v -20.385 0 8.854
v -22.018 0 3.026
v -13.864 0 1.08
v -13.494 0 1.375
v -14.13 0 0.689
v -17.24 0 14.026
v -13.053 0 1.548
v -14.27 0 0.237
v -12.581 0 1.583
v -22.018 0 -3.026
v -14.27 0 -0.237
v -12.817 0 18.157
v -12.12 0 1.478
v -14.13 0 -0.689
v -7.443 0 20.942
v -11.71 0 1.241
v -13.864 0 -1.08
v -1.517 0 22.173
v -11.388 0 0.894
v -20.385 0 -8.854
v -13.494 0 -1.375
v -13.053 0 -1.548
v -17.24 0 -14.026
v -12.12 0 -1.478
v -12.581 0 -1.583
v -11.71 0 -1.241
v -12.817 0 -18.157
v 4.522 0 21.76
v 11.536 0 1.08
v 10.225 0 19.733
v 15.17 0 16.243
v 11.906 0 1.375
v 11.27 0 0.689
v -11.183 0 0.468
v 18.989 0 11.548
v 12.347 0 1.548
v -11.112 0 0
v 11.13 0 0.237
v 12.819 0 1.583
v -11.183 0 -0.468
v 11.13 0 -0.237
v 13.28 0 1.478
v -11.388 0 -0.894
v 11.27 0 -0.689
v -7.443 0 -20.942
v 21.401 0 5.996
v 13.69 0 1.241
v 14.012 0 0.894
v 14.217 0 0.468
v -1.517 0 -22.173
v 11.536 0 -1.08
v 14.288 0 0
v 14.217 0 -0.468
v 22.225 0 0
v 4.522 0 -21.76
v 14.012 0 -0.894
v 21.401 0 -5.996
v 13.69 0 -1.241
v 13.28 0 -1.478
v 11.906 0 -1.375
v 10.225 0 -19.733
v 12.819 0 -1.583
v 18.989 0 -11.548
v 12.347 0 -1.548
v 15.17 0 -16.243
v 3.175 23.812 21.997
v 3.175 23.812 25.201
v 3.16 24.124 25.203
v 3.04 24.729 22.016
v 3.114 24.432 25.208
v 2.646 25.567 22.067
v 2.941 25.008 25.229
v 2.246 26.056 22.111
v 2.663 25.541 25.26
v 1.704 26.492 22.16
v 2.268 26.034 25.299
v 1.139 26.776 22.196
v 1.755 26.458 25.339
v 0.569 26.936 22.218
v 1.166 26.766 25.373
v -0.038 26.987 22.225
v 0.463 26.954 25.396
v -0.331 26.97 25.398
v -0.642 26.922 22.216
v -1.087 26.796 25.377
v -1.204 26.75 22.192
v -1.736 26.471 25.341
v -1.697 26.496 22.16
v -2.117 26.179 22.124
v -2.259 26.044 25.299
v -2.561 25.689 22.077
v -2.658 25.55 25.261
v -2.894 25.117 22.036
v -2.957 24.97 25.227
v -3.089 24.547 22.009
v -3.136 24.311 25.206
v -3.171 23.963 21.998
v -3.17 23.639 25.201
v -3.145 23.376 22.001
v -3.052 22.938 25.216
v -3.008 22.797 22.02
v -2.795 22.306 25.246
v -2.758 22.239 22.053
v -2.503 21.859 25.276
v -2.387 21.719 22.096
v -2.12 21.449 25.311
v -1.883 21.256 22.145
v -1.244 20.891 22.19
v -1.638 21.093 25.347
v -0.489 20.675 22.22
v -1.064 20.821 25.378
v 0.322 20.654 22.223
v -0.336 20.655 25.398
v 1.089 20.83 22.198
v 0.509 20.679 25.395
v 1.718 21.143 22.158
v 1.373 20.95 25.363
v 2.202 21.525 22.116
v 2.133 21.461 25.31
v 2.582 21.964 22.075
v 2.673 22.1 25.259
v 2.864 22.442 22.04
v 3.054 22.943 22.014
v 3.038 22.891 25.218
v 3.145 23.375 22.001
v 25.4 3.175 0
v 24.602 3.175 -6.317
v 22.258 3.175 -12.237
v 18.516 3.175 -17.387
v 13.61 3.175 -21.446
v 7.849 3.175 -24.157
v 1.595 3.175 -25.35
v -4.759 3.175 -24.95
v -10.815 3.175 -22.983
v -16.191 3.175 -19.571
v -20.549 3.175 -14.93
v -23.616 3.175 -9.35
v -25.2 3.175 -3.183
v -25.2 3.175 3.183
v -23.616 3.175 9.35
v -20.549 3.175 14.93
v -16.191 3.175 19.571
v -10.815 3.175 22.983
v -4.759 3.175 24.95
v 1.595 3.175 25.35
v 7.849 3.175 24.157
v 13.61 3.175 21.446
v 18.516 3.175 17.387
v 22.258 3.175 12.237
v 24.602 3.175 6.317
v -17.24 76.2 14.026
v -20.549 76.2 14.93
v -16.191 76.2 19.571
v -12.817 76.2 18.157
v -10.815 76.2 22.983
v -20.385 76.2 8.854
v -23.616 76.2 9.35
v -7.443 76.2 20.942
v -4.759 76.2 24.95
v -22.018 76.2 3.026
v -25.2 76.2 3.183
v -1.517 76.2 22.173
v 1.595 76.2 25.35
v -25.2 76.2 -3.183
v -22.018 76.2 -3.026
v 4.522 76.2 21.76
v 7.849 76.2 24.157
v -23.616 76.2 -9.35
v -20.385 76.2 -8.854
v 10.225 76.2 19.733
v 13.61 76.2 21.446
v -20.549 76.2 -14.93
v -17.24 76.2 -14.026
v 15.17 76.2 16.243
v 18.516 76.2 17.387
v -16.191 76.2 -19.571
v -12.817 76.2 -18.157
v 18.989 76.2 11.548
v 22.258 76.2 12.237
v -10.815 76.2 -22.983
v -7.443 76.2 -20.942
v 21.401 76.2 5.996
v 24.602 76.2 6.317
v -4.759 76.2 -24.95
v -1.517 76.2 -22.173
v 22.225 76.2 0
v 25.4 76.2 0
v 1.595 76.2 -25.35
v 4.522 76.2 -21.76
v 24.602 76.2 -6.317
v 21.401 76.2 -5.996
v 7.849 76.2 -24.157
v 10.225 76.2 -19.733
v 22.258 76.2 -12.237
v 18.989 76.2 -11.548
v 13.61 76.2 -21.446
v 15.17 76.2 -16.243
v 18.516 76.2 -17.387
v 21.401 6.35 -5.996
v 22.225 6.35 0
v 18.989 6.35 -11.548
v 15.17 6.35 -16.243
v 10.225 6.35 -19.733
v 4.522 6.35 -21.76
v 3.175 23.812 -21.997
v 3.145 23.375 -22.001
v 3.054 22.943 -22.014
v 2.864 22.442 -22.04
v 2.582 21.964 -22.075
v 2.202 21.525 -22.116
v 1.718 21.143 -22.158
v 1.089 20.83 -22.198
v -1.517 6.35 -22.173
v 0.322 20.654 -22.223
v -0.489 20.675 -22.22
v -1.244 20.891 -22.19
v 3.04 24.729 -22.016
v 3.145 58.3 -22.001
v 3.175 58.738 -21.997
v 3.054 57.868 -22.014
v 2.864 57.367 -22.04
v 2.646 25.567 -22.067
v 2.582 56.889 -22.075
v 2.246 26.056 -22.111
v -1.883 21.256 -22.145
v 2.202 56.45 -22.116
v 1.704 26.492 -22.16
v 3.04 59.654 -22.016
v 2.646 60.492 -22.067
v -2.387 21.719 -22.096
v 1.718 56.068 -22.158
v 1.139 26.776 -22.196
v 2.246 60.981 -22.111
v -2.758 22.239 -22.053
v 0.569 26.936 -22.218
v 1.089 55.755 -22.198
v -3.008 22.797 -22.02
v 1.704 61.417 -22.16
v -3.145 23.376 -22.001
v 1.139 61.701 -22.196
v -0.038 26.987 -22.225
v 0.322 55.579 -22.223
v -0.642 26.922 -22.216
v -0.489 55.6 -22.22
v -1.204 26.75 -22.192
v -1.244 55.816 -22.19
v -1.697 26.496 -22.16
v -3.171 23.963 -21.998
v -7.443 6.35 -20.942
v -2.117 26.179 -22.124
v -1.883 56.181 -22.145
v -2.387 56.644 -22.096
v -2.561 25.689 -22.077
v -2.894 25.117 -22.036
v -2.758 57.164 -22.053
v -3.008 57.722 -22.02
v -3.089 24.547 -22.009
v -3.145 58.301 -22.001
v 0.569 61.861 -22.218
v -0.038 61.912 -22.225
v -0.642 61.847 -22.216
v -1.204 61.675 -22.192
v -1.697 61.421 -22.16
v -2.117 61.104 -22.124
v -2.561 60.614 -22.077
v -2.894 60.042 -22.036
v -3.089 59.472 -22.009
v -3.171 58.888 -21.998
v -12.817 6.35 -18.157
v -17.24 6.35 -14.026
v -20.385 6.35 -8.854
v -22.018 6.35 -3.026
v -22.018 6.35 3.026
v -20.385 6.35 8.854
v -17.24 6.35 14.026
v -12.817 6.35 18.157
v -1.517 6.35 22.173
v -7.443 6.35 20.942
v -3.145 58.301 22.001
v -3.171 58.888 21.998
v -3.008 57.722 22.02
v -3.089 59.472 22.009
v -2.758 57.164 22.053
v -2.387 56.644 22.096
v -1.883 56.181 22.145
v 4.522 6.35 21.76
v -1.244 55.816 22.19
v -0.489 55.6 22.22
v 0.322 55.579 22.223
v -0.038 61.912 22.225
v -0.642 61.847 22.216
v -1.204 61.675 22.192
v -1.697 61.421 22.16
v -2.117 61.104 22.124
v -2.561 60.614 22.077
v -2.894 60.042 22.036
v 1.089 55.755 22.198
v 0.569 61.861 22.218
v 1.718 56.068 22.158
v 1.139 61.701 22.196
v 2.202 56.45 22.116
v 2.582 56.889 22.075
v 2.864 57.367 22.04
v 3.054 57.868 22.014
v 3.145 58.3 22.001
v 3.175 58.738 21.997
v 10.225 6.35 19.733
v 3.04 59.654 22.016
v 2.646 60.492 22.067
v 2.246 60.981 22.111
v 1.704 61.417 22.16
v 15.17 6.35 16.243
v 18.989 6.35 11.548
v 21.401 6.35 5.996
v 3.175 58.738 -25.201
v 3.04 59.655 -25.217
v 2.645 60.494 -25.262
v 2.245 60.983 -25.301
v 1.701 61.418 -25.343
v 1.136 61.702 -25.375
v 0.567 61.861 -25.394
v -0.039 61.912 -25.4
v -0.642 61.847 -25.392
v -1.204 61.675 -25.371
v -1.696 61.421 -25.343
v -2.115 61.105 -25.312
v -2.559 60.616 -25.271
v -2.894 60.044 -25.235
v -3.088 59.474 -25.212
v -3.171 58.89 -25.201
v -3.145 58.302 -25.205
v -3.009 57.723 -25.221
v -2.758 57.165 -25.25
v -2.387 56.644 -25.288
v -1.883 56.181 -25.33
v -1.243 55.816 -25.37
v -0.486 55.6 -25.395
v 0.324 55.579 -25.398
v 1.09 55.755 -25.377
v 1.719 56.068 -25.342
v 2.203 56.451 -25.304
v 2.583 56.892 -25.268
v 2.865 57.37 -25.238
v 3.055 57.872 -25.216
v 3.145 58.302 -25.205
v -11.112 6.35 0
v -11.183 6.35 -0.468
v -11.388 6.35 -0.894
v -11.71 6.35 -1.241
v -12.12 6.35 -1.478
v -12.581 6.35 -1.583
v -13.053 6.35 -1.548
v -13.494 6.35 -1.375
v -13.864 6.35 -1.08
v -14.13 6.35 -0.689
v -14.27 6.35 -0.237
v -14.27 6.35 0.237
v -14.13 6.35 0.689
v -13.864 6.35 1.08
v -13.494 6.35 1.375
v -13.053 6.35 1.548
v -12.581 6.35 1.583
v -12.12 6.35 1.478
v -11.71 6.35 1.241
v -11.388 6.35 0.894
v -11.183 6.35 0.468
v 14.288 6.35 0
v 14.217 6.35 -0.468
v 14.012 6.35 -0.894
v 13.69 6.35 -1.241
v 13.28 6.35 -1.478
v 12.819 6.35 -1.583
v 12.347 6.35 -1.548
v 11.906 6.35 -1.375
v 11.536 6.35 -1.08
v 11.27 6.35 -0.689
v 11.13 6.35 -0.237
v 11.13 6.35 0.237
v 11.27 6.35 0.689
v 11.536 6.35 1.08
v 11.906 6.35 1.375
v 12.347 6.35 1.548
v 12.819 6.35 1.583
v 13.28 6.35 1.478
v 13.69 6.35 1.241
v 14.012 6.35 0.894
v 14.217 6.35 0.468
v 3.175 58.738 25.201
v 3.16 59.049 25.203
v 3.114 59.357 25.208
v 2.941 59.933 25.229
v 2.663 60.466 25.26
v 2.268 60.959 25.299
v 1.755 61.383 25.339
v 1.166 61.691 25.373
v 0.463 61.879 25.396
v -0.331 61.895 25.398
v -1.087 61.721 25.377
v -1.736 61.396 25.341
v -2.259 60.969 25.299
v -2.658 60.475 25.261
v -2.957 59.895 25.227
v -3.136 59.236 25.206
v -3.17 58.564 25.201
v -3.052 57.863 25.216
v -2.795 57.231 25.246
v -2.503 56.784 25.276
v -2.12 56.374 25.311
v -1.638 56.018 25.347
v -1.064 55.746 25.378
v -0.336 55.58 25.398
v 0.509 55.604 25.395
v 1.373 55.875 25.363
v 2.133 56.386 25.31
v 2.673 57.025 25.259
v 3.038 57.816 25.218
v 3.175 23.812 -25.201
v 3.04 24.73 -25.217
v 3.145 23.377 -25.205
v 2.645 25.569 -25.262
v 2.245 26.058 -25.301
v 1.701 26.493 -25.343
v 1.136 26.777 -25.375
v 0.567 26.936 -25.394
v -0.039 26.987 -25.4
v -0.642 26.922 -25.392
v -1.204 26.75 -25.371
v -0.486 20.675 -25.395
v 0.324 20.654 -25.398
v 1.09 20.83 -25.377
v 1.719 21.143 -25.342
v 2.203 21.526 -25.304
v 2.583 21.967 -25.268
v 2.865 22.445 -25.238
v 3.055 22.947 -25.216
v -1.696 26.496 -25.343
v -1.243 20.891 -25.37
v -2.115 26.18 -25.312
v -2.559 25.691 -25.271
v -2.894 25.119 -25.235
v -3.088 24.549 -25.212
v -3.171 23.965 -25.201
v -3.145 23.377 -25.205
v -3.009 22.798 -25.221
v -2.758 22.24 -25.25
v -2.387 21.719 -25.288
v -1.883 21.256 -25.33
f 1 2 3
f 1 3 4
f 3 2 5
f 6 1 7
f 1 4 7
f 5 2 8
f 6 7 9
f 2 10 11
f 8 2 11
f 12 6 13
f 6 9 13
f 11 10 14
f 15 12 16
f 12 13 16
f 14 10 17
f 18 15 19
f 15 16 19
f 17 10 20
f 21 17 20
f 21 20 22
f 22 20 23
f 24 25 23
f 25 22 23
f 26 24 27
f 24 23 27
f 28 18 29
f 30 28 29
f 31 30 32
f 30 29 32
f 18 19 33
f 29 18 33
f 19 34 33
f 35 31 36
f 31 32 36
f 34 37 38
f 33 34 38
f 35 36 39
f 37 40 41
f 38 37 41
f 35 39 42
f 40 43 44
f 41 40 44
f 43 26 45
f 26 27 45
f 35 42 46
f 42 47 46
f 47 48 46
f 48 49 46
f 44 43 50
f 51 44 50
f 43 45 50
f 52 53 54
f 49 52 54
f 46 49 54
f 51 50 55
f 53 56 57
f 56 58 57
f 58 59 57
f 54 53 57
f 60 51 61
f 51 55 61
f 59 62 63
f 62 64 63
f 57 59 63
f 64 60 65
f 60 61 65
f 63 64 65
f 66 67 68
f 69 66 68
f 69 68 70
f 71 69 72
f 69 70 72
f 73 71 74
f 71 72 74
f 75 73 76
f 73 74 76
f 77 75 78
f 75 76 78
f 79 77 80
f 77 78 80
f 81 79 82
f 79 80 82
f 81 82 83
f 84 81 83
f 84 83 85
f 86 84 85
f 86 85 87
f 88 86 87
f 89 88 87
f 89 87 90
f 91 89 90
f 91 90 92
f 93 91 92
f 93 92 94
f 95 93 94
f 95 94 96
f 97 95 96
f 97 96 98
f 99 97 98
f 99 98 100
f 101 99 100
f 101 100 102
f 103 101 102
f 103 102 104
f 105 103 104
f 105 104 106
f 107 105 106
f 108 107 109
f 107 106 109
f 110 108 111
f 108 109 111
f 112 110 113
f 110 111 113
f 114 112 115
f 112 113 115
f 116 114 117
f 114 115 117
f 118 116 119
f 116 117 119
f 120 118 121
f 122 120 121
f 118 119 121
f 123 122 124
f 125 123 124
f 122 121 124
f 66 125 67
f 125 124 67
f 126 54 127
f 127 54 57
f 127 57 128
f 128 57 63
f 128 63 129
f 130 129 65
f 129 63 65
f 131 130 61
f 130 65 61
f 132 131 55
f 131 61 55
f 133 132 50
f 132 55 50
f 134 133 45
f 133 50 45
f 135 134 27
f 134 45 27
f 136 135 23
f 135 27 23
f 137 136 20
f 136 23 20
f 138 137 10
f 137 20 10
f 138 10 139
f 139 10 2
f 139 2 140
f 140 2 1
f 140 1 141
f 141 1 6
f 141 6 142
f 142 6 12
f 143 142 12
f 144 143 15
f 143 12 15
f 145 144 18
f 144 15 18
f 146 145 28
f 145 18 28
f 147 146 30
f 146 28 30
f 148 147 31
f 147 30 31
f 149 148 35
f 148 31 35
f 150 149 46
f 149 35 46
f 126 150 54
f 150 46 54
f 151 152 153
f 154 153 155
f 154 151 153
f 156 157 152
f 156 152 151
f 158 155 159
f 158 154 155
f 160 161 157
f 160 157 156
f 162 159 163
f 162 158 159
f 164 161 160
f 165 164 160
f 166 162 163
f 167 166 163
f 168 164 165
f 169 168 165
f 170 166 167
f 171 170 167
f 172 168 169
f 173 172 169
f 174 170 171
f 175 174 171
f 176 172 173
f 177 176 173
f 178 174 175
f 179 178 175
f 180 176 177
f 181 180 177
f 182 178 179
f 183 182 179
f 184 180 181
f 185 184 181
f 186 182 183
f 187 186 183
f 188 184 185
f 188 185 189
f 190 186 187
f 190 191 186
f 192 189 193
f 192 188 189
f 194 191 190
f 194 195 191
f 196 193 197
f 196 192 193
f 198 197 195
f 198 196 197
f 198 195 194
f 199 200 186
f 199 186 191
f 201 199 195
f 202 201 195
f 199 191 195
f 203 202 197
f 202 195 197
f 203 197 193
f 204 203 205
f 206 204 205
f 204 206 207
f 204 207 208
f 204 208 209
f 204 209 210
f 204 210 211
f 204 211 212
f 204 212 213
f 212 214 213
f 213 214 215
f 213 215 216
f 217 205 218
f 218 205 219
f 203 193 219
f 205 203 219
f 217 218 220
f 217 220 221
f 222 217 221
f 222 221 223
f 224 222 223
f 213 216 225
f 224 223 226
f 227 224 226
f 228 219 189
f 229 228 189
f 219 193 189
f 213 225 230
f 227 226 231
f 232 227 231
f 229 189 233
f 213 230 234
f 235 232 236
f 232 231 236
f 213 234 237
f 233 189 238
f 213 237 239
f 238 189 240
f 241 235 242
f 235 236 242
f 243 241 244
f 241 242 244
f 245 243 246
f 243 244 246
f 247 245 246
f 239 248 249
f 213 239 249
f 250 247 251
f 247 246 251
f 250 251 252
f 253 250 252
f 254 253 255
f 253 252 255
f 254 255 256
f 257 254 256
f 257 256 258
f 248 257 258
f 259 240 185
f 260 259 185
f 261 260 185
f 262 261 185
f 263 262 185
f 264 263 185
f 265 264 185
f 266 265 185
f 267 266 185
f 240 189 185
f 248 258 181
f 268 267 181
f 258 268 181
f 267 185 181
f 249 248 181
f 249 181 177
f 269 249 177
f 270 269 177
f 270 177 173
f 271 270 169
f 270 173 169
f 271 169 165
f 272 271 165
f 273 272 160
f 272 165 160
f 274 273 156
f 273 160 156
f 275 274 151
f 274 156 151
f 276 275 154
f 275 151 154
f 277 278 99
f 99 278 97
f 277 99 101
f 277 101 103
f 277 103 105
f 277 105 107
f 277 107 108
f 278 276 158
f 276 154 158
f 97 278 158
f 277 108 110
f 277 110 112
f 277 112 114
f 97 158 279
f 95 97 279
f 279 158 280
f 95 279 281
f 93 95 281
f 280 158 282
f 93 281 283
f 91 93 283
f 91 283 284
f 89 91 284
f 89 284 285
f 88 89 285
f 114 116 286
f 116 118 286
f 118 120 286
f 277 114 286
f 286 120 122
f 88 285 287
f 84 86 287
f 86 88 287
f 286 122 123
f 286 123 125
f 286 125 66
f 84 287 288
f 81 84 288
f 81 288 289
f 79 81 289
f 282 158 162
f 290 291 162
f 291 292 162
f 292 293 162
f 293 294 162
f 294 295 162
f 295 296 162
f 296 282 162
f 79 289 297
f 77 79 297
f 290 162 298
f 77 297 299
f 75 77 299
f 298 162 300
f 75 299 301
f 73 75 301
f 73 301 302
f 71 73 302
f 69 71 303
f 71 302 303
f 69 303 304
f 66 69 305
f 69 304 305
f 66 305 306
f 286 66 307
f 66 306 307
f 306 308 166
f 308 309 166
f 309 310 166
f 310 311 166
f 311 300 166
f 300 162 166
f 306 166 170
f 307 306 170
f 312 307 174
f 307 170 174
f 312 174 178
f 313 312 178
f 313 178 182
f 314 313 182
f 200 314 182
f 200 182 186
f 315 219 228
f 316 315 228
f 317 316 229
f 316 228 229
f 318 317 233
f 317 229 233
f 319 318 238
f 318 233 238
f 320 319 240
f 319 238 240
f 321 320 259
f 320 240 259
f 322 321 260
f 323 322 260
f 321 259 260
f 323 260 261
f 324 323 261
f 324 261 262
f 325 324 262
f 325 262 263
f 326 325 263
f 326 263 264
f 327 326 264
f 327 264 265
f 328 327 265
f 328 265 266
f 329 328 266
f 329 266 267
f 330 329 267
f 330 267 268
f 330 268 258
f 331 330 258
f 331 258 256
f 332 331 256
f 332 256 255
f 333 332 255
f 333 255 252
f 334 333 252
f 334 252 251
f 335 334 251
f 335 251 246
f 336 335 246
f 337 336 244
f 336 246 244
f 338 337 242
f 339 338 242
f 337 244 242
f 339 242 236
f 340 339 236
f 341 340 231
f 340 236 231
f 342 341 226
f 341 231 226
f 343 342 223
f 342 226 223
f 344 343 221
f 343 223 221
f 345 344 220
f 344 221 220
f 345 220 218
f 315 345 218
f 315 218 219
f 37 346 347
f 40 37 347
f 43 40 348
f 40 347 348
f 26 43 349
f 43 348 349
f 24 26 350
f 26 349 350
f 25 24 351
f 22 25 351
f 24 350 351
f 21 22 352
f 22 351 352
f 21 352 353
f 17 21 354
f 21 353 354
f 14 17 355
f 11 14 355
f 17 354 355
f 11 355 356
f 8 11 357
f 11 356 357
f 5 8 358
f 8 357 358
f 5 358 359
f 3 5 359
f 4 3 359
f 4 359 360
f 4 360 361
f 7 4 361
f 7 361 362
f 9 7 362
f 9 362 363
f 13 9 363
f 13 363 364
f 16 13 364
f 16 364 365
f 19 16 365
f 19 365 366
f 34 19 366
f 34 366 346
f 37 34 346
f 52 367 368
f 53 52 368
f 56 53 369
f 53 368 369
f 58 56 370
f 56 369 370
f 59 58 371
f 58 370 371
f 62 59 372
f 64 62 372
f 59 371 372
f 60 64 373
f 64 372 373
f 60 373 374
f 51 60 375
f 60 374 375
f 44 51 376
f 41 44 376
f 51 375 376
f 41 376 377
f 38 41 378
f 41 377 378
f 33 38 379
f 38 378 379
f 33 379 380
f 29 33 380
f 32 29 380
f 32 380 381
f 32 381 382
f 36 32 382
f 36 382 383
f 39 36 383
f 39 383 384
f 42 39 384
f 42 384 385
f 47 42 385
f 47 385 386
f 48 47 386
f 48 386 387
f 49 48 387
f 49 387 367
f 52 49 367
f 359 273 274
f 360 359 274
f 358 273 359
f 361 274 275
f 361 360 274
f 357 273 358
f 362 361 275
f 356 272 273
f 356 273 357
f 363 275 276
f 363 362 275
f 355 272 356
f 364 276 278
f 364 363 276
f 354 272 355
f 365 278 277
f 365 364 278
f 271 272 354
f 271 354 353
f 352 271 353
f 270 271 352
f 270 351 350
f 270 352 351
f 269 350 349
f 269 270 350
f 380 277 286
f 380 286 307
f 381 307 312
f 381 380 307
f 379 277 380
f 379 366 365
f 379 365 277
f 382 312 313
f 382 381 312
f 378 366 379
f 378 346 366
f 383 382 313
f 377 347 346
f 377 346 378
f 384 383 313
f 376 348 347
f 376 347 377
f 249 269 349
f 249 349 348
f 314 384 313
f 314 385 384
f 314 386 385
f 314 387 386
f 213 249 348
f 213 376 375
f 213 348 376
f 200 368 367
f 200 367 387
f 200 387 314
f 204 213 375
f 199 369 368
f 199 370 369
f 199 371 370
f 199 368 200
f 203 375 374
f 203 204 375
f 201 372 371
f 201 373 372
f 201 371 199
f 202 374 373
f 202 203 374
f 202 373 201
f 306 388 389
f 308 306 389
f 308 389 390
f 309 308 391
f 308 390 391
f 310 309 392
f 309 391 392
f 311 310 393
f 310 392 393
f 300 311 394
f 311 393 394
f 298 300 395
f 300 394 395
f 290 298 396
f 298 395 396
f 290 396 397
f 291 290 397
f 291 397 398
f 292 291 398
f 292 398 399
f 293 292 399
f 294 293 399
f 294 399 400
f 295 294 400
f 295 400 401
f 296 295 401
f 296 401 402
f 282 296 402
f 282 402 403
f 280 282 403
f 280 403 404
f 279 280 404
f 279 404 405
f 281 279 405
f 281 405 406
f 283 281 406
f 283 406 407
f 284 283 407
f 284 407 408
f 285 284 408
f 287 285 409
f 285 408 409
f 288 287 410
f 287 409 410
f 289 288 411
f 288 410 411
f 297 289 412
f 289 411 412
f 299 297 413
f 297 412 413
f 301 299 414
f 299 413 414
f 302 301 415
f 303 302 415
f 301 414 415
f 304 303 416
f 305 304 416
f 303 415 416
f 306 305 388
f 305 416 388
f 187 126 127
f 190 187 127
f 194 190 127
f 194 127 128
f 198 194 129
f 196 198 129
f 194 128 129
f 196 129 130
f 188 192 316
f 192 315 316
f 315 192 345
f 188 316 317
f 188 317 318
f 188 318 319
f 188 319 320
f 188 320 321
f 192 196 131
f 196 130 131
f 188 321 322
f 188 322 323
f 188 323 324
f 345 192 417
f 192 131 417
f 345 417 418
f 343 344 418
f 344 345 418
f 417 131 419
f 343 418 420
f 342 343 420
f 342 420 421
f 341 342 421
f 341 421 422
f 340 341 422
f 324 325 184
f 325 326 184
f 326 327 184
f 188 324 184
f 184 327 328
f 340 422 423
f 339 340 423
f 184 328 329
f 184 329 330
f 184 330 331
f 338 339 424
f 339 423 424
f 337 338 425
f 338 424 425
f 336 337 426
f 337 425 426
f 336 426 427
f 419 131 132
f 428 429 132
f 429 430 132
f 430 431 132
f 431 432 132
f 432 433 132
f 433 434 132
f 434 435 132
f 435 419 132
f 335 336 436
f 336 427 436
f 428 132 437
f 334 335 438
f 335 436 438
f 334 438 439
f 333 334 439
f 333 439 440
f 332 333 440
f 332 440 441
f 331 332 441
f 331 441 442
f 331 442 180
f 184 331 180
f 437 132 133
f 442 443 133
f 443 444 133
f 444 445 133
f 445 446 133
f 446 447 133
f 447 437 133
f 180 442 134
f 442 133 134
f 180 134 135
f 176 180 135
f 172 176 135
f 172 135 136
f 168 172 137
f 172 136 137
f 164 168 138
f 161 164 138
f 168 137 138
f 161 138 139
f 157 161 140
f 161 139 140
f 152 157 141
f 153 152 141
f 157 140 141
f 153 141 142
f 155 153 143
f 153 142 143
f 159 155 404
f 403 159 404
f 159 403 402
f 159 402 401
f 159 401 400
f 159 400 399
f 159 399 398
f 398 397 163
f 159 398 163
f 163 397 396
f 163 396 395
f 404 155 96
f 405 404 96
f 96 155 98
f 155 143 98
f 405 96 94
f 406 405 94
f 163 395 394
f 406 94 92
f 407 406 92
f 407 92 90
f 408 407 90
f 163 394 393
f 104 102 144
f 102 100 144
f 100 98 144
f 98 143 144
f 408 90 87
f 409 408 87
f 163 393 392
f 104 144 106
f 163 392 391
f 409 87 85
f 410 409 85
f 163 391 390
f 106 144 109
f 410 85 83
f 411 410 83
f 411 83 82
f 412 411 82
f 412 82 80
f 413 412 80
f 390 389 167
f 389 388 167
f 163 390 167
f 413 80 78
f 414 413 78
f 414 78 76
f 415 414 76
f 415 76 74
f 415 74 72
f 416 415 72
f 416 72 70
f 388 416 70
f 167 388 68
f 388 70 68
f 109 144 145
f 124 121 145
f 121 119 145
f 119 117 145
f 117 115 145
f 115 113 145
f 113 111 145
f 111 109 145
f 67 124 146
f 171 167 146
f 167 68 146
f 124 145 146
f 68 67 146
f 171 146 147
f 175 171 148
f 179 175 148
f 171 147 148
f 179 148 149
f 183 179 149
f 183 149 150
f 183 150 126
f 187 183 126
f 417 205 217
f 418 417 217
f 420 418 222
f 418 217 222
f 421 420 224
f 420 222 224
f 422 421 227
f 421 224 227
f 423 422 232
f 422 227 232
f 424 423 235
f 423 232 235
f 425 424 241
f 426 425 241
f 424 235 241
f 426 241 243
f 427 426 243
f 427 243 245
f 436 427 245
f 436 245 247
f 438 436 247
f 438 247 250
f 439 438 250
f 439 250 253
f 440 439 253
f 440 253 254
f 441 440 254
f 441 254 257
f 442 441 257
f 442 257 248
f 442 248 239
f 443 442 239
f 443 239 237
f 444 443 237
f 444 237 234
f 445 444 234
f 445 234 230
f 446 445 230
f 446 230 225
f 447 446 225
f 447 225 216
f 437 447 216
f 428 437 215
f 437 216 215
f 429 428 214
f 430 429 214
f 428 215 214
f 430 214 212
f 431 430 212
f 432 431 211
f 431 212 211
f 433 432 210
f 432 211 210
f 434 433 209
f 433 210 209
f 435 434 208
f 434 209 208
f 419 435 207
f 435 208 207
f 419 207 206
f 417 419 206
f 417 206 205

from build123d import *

# Parameters (mm, degrees)
SKETCH1_R           = 25.4
BOSS_EXTRUDE1_DEPTH = 76.2
SKETCH2_R           = 22.225
CUT_EXTRUDE1_DEPTH  = 69.85
CHAMFER1_SIZE       = 3.175
SKETCH3_R           = 1.5875
CUT_EXTRUDE2_DEPTH  = 63.5
SKETCH6_R           = 3.175
CUT_EXTRUDE3_DEPTH  = 51.8


with BuildPart() as part:
    # Sketch1 → Boss-Extrude1 (new body)
    with BuildSketch(Plane(origin=(0, 0, 0), x_dir=(1, 0, 0), z_dir=(0, 1, 0))):
        Circle(SKETCH1_R)
    extrude(amount=BOSS_EXTRUDE1_DEPTH)

    # Sketch2 → Cut-Extrude1 (cut)
    with BuildSketch(Plane(origin=(0, 76.2, 0), x_dir=(1, 0, 0), z_dir=(0, 1, 0))):
        Circle(SKETCH2_R)
    extrude(amount=-CUT_EXTRUDE1_DEPTH, mode=Mode.SUBTRACT)

    # Chamfer1
    chamfer1_edges = [part.edges().sort_by_distance(p)[0] for p in [
        (-25.4, 0, 0),
    ]]
    chamfer(chamfer1_edges, length=CHAMFER1_SIZE)

    # Sketch3 → Cut-Extrude2 (cut)
    with BuildSketch(Plane(origin=(0, 6.35, 0), x_dir=(1, 0, 0), z_dir=(0, 1, 0))):
        with Locations((-12.7, 0)):
            Circle(SKETCH3_R)
        with Locations((12.7, 0)):
            Circle(SKETCH3_R)
    extrude(amount=-CUT_EXTRUDE2_DEPTH, mode=Mode.SUBTRACT)

    # Sketch6 → Cut-Extrude3 (cut, through all)
    with BuildSketch(Plane.XY.offset(25.4)):
        with Locations((0, 23.8125)):
            Circle(SKETCH6_R)
        with Locations((0, 58.7375)):
            Circle(SKETCH6_R)
    extrude(amount=-CUT_EXTRUDE3_DEPTH, mode=Mode.SUBTRACT)


solid = part.part
